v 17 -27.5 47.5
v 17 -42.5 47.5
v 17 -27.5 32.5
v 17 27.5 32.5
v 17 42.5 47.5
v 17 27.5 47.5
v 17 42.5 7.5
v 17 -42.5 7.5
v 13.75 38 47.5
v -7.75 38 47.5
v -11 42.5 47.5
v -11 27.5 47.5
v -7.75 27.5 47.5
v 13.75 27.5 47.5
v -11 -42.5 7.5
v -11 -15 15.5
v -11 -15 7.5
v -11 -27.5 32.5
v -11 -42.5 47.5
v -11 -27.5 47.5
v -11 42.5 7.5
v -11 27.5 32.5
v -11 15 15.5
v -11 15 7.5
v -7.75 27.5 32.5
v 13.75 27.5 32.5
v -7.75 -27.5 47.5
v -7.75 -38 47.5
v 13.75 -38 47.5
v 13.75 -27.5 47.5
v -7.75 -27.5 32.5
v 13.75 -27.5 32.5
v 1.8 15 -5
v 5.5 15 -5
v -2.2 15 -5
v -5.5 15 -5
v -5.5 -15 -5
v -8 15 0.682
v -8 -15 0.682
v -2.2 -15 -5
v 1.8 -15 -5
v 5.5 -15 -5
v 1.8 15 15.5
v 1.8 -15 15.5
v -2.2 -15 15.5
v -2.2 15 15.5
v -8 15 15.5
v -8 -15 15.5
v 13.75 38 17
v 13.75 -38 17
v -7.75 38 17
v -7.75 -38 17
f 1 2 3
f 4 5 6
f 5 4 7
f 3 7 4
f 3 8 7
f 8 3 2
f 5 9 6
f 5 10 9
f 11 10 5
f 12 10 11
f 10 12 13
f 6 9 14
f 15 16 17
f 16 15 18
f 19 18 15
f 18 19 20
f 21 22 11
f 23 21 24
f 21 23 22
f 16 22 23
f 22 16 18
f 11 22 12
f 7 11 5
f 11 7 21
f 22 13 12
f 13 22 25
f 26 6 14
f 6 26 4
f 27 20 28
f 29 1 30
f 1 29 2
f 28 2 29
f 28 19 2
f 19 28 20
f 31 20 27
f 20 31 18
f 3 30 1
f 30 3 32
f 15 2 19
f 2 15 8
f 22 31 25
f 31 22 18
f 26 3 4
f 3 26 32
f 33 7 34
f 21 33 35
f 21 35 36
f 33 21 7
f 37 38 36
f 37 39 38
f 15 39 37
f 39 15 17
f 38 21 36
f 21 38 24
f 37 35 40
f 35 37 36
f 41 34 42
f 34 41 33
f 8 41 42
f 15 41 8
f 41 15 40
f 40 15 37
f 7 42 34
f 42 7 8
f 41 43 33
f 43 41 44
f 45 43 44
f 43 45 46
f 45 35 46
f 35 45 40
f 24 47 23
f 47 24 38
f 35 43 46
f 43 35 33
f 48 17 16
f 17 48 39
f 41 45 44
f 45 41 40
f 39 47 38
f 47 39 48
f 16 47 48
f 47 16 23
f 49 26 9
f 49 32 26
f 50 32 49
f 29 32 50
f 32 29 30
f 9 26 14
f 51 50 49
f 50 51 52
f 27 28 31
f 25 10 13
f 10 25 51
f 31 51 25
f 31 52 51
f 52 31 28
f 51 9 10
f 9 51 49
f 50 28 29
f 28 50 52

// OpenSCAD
module cdSlot() {
  translate([-0.2, 0, 0]){
    cube(size=[4, 30, 31], center=true);
  }
  translate([-10, 0, 0]){
    cube(size=[4, 30, 31], center=true);
  }
  translate([-5, 0, -10]){
    cube(size=[7, 30, 3], center=true);
  }
  translate([-5, 0, -16]){
    rotate([90, 0, 0]) {
      cylinder(r=6.8, h=30, center=true);
    }
  }
  translate([-30, 0, 30/2-1.1]){
    cube(size=[40, 90, 3.2], center=true);
  }
}

module fanSlot() {
  translate([-0.2, 0, 0]){
    cube(size=[4, 30, 31], center=true);
  }
  translate([-10, 0, 0]){
    cube(size=[4, 30, 31], center=true);
  }
  translate([-5, 0, -10]){
    cube(size=[7, 30, 3], center=true);
  }
  translate([-5, 0, -16]){
    rotate([90, 0, 0]) {
      cylinder(r=6.8, h=30, center=true);
    }
  }
  translate([-25, 0, 30/2-3.3]){
    cube(size=[30, 30, 7.6], center=true);
  }
}
module noteEdgePowerHolder() {
  hull() {
    //holdBlock
    translate([0, 0, 6]) {
      cube(size=[11, 30, 22], center=true);
    }
    //phoneBase
    translate([3, 0, 20]) {
      cube(size=[19, 162, 15], center=true);
    }
  }
  //phoneSideHolder
  translate([3, 0, 20]) {
    translate([0, 162/2-15/2, 10]) {
      cube(size=[19, 15, 35], center=true);
    }
    translate([0, -162/2+15/2, 10]) {
      cube(size=[19, 15, 35], center=true);
    }
  }
}

module noteEdgePower() {
  translate([3, 0, 37]) {
    cube(size=[15, 152, 40], center=true);
  }
}

module hermannHolder() {
  hull() {
    //holdBlock
    translate([0, 0, 6]) {
      cube(size=[11, 30, 22], center=true);
    }
    //phoneBase
    translate([3, 0, 20]) {
      cube(size=[28, 85, 25], center=true);
    }
  }
  //phoneSideHolder
  translate([3, 0, 20]) {
    translate([0, 85/2-15/2, 10]) {
      cube(size=[28, 15, 35], center=true);
    }
    translate([0, -85/2+15/2, 10]) {
      cube(size=[28, 15, 35], center=true);
    }
  }
}
module hermannHandy() {
  translate([3, 0, 37]) {
    cube(size=[21.5, 76, 40], center=true);
  }
}


/*
difference() {
  noteEdgePowerHolder();
  noteEdgePower();
  %cdSlot();
}
*/
//cdSlot();


difference() {
  hermannHolder();
  hermannHandy();
  fanSlot();
}


//fanSlot();
